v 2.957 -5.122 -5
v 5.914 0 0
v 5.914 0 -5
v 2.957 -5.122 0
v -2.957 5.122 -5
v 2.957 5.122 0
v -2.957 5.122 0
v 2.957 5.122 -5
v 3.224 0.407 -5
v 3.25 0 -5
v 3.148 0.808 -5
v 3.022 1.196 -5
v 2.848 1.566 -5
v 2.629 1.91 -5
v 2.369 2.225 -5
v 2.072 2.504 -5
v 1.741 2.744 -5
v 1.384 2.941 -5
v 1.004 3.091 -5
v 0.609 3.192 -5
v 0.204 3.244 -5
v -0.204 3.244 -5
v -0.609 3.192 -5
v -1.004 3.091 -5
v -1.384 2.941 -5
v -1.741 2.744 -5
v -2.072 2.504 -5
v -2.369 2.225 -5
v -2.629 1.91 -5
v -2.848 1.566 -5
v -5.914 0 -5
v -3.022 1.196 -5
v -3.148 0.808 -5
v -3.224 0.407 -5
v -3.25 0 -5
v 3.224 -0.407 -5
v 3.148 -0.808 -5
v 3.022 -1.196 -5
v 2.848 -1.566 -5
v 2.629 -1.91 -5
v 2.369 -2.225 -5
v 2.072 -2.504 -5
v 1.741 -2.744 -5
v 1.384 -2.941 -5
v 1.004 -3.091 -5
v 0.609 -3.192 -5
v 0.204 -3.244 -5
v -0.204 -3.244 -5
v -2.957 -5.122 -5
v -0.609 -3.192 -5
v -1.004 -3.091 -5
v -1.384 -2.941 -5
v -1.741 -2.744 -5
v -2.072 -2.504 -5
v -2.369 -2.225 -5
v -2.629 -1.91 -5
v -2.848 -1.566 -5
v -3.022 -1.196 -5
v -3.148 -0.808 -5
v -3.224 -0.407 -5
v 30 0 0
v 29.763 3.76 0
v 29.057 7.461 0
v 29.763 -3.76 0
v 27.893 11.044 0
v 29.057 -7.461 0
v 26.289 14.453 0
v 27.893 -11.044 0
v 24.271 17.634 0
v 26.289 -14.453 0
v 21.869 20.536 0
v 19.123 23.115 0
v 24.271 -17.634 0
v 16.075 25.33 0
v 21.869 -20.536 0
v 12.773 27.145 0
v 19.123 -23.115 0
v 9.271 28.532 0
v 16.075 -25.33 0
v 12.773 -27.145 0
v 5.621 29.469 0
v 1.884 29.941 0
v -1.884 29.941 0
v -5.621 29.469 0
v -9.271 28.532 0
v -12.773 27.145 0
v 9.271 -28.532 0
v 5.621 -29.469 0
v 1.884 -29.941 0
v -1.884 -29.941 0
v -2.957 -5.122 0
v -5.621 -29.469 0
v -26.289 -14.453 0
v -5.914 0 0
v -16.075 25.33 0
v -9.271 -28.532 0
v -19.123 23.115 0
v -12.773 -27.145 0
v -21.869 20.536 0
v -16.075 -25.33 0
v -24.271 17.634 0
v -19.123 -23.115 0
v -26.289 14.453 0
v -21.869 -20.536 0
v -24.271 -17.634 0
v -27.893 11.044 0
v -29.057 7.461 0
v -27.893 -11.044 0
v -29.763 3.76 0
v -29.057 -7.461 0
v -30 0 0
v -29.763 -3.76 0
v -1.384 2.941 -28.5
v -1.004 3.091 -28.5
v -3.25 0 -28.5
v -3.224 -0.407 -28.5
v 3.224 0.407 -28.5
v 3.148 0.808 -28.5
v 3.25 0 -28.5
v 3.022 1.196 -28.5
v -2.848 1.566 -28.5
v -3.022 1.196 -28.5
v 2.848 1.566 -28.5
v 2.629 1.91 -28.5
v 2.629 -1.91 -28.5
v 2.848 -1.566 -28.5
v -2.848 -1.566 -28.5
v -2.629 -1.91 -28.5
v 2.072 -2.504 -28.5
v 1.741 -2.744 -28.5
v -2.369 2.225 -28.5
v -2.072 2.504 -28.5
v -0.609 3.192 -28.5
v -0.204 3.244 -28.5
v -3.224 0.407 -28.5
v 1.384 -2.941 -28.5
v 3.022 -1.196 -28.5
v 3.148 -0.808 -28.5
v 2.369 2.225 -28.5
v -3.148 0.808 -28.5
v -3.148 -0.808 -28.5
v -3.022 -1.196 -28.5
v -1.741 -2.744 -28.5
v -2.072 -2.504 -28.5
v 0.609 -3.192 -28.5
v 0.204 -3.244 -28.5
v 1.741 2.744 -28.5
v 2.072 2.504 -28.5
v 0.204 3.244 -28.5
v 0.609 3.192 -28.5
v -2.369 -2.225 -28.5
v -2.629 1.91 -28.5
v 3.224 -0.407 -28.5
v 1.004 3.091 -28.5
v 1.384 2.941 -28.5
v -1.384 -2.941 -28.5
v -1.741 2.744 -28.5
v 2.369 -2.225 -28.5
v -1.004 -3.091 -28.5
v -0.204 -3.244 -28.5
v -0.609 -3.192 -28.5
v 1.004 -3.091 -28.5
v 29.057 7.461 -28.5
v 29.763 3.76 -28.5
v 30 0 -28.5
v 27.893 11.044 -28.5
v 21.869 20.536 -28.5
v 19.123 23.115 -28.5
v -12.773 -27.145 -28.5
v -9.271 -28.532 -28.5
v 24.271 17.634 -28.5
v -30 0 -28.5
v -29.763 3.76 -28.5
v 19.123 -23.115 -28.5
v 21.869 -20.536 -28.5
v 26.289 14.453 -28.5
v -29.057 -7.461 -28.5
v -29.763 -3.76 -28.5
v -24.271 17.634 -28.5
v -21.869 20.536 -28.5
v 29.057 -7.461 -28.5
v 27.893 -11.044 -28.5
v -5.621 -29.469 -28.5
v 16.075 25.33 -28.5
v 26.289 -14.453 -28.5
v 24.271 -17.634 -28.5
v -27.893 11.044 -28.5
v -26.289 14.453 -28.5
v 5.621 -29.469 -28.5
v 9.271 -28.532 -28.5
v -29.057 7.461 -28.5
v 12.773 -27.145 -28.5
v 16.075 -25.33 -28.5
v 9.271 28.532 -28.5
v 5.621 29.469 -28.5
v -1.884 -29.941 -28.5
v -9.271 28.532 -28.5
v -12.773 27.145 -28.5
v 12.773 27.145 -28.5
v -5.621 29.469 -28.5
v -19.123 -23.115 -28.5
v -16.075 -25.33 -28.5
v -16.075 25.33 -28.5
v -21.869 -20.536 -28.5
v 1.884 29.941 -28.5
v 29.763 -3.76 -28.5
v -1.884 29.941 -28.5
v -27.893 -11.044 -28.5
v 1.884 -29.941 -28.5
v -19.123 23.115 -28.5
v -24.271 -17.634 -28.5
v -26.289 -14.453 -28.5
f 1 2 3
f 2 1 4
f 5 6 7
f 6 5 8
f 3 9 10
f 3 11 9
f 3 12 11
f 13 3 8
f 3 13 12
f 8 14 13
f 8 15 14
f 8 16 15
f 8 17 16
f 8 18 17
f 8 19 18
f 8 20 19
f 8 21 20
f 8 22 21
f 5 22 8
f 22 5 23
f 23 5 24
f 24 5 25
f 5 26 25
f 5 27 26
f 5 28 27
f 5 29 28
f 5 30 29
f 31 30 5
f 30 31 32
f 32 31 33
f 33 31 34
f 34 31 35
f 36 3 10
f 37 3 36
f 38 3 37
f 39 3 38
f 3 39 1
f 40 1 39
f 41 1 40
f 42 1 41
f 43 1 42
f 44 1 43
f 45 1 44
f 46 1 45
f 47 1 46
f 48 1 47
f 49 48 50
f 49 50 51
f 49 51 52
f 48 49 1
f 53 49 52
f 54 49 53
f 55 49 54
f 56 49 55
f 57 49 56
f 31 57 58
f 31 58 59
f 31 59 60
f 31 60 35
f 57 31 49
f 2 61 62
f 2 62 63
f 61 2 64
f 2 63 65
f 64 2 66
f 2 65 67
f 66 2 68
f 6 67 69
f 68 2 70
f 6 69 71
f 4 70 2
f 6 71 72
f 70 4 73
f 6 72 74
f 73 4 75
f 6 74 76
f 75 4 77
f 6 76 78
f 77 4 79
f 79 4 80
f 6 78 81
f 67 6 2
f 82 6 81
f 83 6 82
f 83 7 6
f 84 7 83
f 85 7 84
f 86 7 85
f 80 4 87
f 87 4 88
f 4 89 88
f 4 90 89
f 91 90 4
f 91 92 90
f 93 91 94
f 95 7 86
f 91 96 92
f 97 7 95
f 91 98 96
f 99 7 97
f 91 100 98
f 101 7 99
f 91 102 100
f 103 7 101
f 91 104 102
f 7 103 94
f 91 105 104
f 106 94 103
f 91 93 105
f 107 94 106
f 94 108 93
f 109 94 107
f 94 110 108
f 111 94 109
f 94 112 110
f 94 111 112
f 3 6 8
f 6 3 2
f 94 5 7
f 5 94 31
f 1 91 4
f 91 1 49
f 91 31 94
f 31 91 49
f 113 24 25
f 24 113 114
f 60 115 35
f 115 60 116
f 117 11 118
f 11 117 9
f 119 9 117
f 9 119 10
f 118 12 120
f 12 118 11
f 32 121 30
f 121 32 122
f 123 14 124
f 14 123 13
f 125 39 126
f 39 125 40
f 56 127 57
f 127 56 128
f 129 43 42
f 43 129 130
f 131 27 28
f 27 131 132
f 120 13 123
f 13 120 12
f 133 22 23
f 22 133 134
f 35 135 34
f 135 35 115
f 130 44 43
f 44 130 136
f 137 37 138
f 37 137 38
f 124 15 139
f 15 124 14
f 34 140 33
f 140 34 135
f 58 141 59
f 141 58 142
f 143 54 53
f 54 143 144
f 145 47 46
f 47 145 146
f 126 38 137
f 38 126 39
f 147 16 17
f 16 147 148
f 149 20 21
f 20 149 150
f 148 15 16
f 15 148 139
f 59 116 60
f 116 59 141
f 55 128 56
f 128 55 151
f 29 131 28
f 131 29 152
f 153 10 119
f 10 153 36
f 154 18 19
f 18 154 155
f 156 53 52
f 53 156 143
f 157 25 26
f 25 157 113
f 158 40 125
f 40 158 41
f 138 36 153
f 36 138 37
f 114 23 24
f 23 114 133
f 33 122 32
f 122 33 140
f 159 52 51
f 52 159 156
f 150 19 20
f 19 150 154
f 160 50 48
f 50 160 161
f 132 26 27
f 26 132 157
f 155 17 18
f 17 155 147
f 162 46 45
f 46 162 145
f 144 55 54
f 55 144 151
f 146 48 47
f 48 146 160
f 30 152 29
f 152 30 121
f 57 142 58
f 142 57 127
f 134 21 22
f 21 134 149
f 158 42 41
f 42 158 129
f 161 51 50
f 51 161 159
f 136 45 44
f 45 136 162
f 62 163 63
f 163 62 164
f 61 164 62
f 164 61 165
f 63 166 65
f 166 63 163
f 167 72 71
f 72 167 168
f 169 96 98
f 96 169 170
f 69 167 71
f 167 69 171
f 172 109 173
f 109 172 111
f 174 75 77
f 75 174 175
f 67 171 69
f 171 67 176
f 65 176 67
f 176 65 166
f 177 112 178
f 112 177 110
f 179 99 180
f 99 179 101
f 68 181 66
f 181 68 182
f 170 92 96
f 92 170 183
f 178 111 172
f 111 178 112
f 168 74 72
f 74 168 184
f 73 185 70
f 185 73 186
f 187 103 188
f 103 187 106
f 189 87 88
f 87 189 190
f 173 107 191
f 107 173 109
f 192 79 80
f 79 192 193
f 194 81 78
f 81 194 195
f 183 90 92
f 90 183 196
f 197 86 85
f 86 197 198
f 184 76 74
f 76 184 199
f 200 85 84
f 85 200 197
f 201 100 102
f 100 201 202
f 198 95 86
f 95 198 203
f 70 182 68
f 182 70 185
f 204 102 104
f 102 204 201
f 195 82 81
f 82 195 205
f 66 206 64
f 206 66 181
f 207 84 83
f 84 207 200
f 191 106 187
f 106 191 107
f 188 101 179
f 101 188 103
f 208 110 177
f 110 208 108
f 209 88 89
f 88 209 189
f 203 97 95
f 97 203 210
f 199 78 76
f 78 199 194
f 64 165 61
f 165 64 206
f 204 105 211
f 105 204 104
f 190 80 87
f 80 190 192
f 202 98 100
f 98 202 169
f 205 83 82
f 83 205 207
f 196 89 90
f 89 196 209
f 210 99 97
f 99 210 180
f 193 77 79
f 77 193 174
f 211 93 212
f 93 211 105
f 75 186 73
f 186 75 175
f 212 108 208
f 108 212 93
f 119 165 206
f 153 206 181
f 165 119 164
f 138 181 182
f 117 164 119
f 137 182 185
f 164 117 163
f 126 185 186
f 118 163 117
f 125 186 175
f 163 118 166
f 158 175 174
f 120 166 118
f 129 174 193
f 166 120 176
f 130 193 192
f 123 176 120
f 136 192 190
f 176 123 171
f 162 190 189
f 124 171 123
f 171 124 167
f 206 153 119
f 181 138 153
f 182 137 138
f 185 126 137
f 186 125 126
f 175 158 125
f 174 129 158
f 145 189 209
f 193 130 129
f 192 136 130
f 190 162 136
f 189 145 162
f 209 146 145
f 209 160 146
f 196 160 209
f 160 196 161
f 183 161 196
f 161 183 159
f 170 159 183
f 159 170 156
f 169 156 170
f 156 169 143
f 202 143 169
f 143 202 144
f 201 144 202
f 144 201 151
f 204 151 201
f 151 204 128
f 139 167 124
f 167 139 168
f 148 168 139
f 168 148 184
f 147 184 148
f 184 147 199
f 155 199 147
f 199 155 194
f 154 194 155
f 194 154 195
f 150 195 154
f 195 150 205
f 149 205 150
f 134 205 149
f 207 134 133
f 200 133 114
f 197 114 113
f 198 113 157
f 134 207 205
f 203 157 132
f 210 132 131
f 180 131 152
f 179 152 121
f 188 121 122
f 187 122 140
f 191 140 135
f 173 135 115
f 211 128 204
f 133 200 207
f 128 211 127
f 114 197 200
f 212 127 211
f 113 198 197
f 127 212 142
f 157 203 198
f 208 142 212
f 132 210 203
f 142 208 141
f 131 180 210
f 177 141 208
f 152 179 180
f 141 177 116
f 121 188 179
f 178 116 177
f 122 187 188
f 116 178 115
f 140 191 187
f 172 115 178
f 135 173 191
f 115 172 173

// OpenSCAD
$fn = 50;

difference() {
	union() {
		translate(v = [0, 0, -28.5]) {
			cylinder(h = 28.5, r = 30.0);
		}
	}
	union() {
		translate(v = [0, 0, 0]) {
			rotate(a = [0, 0, 0]) {
				difference() {
					union() {
						translate(v = [0, 0, -5]) {
							linear_extrude(height = 5) {
								polygon(points = [[5.914249999999999, 0.0], [2.957125, 5.1218907443321156], [-2.9571249999999982, 5.1218907443321156], [-5.914249999999999, 7.242867331857232e-16], [-2.9571250000000022, -5.121890744332115], [2.9571249999999956, -5.121890744332118]]);
							}
						}
					}
					union();
				}
			}
		}
		#translate(v = [0, 0, -100.0]) {
			cylinder(h = 200, r = 3.25);
		}
	}
}
